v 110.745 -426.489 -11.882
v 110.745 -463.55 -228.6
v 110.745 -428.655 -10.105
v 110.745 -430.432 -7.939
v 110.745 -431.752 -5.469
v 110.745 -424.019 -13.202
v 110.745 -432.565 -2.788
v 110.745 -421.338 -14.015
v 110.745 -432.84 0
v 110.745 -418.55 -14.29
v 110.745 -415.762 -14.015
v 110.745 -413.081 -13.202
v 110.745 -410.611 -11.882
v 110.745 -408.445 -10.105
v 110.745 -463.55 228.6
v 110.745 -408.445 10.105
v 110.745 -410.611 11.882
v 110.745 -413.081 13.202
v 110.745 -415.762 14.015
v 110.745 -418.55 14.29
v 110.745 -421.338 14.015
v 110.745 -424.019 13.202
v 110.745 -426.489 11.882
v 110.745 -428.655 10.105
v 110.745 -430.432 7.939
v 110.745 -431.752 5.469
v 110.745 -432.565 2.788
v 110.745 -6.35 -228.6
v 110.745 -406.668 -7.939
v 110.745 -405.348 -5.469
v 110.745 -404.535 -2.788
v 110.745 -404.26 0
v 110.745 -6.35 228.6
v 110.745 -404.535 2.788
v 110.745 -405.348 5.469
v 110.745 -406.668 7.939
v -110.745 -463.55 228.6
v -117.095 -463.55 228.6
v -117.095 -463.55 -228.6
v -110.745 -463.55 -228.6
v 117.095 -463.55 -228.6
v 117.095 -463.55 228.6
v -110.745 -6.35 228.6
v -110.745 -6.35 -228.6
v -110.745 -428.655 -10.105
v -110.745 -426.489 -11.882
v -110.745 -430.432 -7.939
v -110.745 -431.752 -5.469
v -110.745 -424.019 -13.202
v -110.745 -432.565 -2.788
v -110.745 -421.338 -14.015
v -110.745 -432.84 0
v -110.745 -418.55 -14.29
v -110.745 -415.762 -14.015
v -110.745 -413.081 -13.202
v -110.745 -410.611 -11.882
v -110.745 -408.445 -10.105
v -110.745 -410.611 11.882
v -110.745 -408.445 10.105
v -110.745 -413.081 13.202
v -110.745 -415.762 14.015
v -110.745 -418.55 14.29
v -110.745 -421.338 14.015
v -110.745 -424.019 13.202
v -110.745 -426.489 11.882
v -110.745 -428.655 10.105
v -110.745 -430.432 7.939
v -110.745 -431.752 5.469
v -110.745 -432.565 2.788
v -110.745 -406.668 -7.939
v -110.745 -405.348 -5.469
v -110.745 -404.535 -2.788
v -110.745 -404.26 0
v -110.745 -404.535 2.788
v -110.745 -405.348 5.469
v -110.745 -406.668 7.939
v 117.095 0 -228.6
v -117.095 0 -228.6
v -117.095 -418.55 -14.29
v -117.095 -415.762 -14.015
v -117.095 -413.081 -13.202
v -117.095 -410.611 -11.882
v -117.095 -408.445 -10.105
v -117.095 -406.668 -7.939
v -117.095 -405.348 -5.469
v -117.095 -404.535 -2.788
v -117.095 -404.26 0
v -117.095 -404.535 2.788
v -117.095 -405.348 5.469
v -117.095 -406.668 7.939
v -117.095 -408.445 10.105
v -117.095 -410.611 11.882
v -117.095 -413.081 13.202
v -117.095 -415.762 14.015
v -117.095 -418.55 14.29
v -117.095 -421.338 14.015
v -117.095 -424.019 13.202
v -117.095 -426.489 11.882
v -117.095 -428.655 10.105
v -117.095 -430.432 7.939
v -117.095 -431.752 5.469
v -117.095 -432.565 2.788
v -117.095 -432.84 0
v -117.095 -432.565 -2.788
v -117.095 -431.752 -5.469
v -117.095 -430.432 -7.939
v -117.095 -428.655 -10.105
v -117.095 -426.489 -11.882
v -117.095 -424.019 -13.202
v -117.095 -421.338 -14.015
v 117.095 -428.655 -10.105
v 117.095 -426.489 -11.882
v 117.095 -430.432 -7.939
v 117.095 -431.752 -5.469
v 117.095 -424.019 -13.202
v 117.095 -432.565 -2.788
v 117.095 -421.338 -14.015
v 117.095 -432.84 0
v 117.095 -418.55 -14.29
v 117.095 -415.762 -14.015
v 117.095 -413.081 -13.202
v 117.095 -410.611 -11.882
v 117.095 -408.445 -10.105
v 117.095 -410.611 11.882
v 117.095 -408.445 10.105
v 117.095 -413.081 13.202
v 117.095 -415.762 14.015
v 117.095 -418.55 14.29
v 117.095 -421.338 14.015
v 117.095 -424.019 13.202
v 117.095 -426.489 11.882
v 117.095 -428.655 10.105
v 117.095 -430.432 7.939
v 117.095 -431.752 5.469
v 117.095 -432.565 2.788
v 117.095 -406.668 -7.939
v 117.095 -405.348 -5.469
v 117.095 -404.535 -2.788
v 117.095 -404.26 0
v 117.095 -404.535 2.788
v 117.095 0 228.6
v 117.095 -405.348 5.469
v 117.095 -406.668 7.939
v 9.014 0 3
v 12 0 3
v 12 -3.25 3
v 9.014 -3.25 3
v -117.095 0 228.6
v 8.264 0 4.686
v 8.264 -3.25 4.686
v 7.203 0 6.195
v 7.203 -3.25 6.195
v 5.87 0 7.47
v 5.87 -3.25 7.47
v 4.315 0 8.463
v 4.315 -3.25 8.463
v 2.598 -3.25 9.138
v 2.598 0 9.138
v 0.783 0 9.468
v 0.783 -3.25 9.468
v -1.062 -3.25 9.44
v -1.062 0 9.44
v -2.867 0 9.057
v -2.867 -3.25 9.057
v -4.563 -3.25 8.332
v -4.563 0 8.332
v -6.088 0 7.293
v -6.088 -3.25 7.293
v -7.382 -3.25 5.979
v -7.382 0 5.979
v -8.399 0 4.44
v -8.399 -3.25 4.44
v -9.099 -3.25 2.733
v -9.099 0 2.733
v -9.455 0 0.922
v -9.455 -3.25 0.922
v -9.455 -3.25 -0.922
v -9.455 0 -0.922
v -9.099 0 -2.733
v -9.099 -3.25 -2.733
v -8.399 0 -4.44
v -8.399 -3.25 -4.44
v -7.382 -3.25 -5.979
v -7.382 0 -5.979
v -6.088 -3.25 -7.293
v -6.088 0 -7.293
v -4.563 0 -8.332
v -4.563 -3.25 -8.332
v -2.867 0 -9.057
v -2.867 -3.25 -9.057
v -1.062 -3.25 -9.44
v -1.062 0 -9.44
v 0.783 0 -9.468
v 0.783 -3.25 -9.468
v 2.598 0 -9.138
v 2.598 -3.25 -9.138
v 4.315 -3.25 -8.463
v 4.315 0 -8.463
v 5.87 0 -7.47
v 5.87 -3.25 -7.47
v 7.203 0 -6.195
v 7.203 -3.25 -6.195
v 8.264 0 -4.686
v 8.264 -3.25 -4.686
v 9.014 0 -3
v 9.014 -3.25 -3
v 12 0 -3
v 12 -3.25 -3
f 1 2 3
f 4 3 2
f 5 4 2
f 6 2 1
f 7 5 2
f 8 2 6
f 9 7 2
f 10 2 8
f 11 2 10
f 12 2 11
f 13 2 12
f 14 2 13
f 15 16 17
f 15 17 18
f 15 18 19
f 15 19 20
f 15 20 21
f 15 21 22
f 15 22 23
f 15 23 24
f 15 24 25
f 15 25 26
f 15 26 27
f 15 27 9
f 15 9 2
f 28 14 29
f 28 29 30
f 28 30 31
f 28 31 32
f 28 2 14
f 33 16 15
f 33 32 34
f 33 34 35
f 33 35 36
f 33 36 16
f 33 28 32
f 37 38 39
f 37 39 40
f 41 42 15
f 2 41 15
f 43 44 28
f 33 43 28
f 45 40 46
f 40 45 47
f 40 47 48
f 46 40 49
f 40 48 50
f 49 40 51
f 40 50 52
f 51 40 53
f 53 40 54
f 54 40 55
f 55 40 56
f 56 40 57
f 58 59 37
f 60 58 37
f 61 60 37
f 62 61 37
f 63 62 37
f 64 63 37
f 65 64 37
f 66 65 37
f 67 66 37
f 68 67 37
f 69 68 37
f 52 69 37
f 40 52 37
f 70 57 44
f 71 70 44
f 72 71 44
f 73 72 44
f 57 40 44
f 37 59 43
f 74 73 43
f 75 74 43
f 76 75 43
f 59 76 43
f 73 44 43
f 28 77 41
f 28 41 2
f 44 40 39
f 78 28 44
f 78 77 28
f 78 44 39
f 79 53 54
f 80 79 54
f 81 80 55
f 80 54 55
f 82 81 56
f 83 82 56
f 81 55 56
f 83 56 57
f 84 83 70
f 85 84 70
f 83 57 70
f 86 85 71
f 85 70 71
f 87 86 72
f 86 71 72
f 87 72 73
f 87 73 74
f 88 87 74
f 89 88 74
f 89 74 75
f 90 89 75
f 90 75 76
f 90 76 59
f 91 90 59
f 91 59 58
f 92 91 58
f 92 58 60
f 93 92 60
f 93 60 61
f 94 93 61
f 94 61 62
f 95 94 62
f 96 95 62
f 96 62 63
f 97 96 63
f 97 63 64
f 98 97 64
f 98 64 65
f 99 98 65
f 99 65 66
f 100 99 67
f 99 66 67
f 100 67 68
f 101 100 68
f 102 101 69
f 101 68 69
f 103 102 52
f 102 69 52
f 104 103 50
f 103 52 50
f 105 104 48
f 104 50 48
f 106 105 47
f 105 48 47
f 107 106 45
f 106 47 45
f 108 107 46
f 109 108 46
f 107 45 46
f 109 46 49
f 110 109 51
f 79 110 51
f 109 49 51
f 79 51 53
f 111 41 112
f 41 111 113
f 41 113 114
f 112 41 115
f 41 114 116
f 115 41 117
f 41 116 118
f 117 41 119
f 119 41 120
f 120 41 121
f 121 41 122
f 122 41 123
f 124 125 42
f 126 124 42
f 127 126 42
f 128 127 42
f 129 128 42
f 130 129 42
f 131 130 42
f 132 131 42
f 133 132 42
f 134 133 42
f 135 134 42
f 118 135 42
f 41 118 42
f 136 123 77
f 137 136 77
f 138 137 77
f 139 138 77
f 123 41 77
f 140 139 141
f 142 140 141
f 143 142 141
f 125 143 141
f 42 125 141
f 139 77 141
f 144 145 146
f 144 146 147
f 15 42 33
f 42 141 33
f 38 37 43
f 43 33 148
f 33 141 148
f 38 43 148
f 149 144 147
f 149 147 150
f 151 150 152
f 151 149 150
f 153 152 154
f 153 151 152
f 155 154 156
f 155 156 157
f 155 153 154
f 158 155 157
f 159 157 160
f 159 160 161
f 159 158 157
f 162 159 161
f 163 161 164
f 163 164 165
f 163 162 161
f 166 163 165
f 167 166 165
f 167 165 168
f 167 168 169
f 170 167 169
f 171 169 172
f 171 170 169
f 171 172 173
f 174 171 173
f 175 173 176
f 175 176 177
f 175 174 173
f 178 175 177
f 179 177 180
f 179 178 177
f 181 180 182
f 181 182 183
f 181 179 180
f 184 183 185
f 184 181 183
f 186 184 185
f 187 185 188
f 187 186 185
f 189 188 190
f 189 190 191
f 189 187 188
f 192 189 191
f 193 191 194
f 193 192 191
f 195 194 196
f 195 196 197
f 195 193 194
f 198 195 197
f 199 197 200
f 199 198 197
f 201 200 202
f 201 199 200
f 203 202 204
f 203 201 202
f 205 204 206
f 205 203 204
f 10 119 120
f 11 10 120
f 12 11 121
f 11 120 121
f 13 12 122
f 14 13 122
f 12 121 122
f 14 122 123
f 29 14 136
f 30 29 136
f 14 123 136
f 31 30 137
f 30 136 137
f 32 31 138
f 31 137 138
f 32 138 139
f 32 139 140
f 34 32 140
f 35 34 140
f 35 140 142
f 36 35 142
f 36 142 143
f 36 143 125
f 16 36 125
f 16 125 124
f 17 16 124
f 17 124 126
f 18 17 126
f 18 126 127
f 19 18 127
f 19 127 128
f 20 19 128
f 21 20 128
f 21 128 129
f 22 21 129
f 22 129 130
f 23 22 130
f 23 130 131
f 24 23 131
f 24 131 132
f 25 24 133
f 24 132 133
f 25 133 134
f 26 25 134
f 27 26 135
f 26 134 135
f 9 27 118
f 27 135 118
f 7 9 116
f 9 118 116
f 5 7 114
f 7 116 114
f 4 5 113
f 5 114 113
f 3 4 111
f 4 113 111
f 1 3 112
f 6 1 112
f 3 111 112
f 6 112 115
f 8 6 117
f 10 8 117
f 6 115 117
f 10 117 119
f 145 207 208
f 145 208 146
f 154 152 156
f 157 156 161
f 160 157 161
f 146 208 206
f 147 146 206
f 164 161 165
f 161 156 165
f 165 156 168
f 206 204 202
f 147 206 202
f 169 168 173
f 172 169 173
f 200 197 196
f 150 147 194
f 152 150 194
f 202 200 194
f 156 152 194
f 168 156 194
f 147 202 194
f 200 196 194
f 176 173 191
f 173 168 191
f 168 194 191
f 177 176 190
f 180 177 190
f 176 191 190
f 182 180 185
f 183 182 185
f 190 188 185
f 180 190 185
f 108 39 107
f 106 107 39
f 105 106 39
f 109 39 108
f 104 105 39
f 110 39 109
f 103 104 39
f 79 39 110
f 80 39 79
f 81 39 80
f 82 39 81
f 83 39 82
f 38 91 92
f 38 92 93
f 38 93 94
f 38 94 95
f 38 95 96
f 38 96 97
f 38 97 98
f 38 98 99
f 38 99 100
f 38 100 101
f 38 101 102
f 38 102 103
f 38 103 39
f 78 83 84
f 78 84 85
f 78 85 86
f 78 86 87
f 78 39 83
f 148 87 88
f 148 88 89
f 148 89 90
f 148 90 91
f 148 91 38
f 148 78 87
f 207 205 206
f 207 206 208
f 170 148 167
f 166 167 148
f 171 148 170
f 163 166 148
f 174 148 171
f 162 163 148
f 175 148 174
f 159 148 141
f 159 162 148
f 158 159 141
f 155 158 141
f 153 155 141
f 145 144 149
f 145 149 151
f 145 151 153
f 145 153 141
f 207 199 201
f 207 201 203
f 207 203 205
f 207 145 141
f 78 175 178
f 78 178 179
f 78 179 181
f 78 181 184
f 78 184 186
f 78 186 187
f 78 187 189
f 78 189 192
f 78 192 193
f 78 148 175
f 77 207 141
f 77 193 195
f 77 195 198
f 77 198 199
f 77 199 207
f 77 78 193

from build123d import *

# Parameters (mm, degrees)
SKETCH1_W           = 234.19
SKETCH1_H           = 457.2
BOSS_EXTRUDE1_DEPTH = 6.35
SKETCH2_W           = 6.35
SKETCH2_H           = 457.2
BOSS_EXTRUDE2_DEPTH = 457.2
SKETCH3_R           = 14.29
CUT_EXTRUDE1_DEPTH  = 558.8
CUT_EXTRUDE2_DEPTH  = 3.25


with BuildPart() as part:
    # Sketch1 → Boss-Extrude1 (new body)
    with BuildSketch(Plane(origin=(0, 0, 0), x_dir=(1, 0, 0), z_dir=(0, 1, 0))):
        Rectangle(SKETCH1_W, SKETCH1_H)
    extrude(amount=-BOSS_EXTRUDE1_DEPTH)

    # Sketch2 → Boss-Extrude2 (add)
    with BuildSketch(Plane.XZ.offset(6.35)):
        with Locations((-113.92, 0)):
            Rectangle(SKETCH2_W, SKETCH2_H)
    boss_extrude2 = extrude(amount=BOSS_EXTRUDE2_DEPTH)

    # Mirror1: Boss-Extrude2 across plane
    add(boss_extrude2.mirror(Plane(origin=(0, 0, 0), x_dir=(0, 0, 1), z_dir=(1, 0, 0))))

    # Sketch3 → Cut-Extrude1 (cut)
    with BuildSketch(Plane(origin=(117.095, 0, 0), x_dir=(0, 0, -1), z_dir=(1, 0, 0))):
        with Locations((0, -418.55)):
            Circle(SKETCH3_R)
    extrude(amount=-CUT_EXTRUDE1_DEPTH, mode=Mode.SUBTRACT)

    # Sketch4 → Cut-Extrude2 (cut)
    with BuildSketch(Plane(origin=(0, 0, 0), x_dir=(1, 0, 0), z_dir=(0, 1, 0))):
        with BuildLine():
            Line((9.013878189, 3), (12, 3))
            Line((12, 3), (12, -3))
            Line((12, -3), (9.013878189, -3))
            ThreePointArc((9.013878189, -3), (-9.5, 0), (9.013878189, 3))
        make_face()
    extrude(amount=-CUT_EXTRUDE2_DEPTH, mode=Mode.SUBTRACT)


solid = part.part
